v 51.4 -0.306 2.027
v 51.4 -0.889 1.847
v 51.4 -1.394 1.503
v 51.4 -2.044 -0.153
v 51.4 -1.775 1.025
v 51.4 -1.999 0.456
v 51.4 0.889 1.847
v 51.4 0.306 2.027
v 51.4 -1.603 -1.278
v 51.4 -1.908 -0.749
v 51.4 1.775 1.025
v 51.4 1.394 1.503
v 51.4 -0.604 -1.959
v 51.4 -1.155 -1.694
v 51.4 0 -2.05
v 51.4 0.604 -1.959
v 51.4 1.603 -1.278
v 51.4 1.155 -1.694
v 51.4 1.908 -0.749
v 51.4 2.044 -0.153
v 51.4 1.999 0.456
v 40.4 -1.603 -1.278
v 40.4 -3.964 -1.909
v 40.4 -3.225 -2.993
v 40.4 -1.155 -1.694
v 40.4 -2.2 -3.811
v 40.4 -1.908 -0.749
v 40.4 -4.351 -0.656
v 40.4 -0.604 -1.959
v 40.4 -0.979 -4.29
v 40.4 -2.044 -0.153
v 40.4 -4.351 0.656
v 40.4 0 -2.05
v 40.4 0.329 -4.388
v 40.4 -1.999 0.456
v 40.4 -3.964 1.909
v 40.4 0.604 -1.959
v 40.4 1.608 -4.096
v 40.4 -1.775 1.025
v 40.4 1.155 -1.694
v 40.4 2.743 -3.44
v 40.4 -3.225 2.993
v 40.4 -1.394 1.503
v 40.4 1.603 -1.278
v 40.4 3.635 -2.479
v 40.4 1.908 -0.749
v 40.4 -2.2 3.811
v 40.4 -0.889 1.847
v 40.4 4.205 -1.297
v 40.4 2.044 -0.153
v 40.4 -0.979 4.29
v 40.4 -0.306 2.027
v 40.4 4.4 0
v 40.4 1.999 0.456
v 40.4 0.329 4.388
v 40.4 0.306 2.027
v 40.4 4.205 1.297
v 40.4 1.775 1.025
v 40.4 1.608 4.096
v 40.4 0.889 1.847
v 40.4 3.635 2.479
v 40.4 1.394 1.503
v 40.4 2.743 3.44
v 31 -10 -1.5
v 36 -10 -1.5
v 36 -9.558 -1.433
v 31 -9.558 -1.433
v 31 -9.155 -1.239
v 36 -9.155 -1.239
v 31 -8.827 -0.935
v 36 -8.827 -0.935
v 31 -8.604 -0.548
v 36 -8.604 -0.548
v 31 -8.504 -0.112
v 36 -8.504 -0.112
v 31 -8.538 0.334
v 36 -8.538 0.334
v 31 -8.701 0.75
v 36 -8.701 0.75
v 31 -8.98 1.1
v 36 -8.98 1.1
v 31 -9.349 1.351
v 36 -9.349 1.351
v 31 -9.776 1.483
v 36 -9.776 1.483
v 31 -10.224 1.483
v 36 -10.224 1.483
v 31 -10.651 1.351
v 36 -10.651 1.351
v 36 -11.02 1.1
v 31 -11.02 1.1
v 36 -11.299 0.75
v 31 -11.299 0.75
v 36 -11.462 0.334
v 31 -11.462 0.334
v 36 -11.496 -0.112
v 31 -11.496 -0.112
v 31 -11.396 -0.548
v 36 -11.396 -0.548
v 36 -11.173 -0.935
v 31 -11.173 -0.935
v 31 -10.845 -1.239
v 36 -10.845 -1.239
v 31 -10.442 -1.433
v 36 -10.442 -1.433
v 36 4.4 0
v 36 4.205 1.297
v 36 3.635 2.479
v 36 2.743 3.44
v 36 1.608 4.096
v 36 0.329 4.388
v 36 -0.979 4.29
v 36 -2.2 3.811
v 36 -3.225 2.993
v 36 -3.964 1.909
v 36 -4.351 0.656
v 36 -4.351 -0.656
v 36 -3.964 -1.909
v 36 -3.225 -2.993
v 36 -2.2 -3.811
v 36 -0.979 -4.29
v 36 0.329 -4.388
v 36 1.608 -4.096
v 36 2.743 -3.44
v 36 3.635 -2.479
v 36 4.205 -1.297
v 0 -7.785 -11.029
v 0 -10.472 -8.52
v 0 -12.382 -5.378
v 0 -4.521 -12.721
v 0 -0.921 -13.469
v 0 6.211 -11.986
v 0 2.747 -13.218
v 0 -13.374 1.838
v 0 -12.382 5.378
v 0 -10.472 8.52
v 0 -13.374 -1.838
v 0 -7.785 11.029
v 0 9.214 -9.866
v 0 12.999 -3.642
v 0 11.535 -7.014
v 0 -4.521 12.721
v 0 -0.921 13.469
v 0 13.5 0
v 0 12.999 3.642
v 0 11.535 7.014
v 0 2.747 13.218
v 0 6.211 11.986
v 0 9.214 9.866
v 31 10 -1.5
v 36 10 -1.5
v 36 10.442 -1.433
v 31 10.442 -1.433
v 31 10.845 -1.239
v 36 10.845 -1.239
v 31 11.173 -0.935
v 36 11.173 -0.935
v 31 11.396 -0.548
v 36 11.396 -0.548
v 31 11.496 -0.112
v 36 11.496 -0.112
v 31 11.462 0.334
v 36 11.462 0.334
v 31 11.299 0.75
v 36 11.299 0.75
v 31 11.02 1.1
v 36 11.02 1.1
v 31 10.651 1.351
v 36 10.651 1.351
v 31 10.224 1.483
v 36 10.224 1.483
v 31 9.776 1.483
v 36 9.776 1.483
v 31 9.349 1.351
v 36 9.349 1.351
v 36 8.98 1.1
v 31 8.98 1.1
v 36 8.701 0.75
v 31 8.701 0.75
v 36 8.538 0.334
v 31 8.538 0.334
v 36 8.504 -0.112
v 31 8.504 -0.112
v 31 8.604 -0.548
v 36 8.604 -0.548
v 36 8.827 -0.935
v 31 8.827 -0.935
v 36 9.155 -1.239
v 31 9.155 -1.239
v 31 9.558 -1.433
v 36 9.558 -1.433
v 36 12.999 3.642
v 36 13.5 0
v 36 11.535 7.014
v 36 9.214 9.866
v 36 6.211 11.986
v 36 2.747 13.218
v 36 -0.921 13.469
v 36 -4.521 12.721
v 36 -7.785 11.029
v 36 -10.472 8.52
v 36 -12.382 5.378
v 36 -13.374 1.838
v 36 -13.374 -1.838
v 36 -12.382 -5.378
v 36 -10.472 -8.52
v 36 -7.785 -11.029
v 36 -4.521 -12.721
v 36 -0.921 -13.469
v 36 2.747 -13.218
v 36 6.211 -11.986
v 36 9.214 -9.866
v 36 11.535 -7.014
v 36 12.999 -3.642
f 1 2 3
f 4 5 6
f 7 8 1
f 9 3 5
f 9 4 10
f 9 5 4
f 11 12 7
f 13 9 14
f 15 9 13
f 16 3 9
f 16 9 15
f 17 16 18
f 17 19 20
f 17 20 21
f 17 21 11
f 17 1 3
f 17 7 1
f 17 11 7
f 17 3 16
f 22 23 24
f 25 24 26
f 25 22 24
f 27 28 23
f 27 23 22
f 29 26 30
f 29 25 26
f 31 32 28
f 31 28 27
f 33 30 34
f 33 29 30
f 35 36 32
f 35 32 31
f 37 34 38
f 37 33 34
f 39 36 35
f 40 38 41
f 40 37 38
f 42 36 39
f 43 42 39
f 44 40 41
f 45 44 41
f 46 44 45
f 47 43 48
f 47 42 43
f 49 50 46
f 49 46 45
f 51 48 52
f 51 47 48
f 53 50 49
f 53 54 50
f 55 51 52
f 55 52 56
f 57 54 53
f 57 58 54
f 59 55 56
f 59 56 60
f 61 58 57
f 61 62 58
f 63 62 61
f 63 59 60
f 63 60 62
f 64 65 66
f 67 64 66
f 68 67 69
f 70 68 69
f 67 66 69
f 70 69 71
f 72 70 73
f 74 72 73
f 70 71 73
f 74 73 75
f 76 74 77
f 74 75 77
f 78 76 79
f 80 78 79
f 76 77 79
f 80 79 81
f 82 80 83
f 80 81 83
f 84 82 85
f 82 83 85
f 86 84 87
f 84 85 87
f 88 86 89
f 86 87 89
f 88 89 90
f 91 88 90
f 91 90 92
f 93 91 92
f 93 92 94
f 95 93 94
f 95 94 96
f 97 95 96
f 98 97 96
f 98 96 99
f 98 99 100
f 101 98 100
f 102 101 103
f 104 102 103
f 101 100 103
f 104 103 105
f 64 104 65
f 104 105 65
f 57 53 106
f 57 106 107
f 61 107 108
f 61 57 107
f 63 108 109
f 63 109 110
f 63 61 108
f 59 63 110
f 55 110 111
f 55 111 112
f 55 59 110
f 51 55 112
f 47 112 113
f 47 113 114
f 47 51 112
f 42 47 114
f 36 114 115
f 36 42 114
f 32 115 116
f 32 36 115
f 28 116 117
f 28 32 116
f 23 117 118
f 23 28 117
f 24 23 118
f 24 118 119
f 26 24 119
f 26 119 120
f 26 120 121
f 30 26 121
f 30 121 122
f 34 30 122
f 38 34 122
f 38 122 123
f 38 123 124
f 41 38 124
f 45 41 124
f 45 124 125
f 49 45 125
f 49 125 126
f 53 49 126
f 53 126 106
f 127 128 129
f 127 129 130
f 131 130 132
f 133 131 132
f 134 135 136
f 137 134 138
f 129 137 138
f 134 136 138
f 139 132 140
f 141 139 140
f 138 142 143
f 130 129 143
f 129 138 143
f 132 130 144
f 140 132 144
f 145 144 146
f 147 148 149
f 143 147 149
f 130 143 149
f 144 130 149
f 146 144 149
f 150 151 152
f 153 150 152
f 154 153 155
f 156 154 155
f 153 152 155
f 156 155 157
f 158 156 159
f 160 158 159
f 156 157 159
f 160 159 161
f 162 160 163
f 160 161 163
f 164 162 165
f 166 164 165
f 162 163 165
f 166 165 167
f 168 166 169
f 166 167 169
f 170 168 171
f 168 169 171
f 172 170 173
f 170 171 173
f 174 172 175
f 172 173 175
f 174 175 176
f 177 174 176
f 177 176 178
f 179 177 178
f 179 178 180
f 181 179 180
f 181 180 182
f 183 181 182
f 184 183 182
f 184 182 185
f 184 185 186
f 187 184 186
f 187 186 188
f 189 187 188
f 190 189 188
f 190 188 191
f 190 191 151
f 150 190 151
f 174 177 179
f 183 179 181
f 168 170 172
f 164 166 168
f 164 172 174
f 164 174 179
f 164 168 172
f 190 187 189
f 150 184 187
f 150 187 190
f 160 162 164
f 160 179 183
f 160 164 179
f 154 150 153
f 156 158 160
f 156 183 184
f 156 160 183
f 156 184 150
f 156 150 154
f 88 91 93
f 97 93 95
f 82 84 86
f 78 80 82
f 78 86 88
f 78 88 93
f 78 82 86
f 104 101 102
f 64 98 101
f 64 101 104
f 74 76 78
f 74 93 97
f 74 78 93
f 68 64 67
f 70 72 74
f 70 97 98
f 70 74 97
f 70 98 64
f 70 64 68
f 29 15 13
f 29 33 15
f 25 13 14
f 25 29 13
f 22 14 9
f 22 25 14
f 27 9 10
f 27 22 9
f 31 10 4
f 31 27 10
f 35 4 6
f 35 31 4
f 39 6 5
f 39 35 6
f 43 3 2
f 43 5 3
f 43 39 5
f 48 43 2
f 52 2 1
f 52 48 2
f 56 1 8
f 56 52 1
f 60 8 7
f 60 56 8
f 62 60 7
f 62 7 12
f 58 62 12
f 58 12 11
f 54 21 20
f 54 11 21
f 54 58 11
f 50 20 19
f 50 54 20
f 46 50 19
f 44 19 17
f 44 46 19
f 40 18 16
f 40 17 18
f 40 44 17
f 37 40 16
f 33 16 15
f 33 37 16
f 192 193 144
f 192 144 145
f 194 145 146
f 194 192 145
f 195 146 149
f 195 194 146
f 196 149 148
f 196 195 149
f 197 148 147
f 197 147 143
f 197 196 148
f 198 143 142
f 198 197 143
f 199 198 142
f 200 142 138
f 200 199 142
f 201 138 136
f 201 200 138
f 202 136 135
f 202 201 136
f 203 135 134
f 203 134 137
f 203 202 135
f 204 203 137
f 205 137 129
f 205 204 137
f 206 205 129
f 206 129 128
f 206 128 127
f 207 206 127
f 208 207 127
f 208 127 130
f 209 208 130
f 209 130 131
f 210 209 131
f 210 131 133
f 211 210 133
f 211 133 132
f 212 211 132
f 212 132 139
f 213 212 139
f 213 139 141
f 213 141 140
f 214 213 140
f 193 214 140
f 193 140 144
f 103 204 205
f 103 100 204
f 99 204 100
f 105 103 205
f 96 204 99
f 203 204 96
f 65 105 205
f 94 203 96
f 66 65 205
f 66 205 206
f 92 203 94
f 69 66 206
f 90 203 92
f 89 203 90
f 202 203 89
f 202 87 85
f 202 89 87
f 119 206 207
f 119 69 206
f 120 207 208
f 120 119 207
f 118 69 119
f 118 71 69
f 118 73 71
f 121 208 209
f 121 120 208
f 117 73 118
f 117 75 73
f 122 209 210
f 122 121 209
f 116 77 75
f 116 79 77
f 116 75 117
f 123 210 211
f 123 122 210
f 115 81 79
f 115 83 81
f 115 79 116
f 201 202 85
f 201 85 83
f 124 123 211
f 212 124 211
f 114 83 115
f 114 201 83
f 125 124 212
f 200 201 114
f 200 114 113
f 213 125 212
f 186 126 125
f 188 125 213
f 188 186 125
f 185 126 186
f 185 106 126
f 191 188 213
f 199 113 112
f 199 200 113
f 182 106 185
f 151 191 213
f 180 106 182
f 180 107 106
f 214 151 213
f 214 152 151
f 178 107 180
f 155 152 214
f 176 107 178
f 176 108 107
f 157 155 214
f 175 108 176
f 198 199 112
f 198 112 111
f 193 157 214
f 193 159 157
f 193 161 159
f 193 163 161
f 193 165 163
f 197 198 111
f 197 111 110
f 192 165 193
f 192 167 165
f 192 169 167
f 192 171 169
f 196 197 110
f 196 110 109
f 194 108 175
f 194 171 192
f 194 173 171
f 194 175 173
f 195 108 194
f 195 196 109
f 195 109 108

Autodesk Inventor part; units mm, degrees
ref_plane "YZ Plane" through (0, 0, 0) normal (1, 0, 0) x (0, 1, 0)
ref_plane "XZ Plane" through (0, 0, 0) normal (0, 1, 0) x (-1, 0, 0)
ref_plane "XY Plane" through (0, 0, 0) normal (0, 0, 1) x (1, 0, 0)
sketch "Sketch1" plane through (0, 0, 0) normal (0, 0, 1) x (1, 0, 0)
  line L0 (0, 0) -> (0, 13.5)
  line L1 (0, 13.5) -> (36, 13.5)
  line L2 (36, 13.5) -> (36, 4.4)
  line L3 (36, 4.4) -> (40.4, 4.4)
  line L4 (40.4, 4.4) -> (40.4, 0)
  line L5 (40.4, 0) -> (0, 0)
  line L6 (0, 0) -> (68.0723, 0)
  dimension "d0" = 27
  dimension "d1" = 36
  dimension "d2" = 8.8
  dimension "d3" = 4.4
revolve "Revolution1" add sketch "Sketch1" angle 360 about axis through (0, 0, 0) along (1, 0, 0)
sketch "Sketch2" plane through (40.4, 0, 0) normal (1, 0, 0) x (0, 0, -1)
  circle A0 centre (0, 0) radius 4.4 projected
  circle A1 centre (0, 0) radius 2.05
  dimension "d5" = 4.1
extrude "Extrusion1" add sketch "Sketch2" along normal blind 11 contours A1
sketch "Sketch3" plane through (36, 0, 0) normal (1, 0, 0) x (0, 0, -1)
  circle A0 centre (0, 0) radius 4.4 projected
  circle A1 centre (0, 10) radius 1.5
  circle A2 centre (0, -10) radius 1.5
  dimension "d8" = 3
  dimension "d9" = 3
  dimension "d10" = 20
  dimension "d11" = 10
extrude "Extrusion2" cut sketch "Sketch3" against normal blind 5 contours A1 | A2
properties part number "Motor Sensor"
